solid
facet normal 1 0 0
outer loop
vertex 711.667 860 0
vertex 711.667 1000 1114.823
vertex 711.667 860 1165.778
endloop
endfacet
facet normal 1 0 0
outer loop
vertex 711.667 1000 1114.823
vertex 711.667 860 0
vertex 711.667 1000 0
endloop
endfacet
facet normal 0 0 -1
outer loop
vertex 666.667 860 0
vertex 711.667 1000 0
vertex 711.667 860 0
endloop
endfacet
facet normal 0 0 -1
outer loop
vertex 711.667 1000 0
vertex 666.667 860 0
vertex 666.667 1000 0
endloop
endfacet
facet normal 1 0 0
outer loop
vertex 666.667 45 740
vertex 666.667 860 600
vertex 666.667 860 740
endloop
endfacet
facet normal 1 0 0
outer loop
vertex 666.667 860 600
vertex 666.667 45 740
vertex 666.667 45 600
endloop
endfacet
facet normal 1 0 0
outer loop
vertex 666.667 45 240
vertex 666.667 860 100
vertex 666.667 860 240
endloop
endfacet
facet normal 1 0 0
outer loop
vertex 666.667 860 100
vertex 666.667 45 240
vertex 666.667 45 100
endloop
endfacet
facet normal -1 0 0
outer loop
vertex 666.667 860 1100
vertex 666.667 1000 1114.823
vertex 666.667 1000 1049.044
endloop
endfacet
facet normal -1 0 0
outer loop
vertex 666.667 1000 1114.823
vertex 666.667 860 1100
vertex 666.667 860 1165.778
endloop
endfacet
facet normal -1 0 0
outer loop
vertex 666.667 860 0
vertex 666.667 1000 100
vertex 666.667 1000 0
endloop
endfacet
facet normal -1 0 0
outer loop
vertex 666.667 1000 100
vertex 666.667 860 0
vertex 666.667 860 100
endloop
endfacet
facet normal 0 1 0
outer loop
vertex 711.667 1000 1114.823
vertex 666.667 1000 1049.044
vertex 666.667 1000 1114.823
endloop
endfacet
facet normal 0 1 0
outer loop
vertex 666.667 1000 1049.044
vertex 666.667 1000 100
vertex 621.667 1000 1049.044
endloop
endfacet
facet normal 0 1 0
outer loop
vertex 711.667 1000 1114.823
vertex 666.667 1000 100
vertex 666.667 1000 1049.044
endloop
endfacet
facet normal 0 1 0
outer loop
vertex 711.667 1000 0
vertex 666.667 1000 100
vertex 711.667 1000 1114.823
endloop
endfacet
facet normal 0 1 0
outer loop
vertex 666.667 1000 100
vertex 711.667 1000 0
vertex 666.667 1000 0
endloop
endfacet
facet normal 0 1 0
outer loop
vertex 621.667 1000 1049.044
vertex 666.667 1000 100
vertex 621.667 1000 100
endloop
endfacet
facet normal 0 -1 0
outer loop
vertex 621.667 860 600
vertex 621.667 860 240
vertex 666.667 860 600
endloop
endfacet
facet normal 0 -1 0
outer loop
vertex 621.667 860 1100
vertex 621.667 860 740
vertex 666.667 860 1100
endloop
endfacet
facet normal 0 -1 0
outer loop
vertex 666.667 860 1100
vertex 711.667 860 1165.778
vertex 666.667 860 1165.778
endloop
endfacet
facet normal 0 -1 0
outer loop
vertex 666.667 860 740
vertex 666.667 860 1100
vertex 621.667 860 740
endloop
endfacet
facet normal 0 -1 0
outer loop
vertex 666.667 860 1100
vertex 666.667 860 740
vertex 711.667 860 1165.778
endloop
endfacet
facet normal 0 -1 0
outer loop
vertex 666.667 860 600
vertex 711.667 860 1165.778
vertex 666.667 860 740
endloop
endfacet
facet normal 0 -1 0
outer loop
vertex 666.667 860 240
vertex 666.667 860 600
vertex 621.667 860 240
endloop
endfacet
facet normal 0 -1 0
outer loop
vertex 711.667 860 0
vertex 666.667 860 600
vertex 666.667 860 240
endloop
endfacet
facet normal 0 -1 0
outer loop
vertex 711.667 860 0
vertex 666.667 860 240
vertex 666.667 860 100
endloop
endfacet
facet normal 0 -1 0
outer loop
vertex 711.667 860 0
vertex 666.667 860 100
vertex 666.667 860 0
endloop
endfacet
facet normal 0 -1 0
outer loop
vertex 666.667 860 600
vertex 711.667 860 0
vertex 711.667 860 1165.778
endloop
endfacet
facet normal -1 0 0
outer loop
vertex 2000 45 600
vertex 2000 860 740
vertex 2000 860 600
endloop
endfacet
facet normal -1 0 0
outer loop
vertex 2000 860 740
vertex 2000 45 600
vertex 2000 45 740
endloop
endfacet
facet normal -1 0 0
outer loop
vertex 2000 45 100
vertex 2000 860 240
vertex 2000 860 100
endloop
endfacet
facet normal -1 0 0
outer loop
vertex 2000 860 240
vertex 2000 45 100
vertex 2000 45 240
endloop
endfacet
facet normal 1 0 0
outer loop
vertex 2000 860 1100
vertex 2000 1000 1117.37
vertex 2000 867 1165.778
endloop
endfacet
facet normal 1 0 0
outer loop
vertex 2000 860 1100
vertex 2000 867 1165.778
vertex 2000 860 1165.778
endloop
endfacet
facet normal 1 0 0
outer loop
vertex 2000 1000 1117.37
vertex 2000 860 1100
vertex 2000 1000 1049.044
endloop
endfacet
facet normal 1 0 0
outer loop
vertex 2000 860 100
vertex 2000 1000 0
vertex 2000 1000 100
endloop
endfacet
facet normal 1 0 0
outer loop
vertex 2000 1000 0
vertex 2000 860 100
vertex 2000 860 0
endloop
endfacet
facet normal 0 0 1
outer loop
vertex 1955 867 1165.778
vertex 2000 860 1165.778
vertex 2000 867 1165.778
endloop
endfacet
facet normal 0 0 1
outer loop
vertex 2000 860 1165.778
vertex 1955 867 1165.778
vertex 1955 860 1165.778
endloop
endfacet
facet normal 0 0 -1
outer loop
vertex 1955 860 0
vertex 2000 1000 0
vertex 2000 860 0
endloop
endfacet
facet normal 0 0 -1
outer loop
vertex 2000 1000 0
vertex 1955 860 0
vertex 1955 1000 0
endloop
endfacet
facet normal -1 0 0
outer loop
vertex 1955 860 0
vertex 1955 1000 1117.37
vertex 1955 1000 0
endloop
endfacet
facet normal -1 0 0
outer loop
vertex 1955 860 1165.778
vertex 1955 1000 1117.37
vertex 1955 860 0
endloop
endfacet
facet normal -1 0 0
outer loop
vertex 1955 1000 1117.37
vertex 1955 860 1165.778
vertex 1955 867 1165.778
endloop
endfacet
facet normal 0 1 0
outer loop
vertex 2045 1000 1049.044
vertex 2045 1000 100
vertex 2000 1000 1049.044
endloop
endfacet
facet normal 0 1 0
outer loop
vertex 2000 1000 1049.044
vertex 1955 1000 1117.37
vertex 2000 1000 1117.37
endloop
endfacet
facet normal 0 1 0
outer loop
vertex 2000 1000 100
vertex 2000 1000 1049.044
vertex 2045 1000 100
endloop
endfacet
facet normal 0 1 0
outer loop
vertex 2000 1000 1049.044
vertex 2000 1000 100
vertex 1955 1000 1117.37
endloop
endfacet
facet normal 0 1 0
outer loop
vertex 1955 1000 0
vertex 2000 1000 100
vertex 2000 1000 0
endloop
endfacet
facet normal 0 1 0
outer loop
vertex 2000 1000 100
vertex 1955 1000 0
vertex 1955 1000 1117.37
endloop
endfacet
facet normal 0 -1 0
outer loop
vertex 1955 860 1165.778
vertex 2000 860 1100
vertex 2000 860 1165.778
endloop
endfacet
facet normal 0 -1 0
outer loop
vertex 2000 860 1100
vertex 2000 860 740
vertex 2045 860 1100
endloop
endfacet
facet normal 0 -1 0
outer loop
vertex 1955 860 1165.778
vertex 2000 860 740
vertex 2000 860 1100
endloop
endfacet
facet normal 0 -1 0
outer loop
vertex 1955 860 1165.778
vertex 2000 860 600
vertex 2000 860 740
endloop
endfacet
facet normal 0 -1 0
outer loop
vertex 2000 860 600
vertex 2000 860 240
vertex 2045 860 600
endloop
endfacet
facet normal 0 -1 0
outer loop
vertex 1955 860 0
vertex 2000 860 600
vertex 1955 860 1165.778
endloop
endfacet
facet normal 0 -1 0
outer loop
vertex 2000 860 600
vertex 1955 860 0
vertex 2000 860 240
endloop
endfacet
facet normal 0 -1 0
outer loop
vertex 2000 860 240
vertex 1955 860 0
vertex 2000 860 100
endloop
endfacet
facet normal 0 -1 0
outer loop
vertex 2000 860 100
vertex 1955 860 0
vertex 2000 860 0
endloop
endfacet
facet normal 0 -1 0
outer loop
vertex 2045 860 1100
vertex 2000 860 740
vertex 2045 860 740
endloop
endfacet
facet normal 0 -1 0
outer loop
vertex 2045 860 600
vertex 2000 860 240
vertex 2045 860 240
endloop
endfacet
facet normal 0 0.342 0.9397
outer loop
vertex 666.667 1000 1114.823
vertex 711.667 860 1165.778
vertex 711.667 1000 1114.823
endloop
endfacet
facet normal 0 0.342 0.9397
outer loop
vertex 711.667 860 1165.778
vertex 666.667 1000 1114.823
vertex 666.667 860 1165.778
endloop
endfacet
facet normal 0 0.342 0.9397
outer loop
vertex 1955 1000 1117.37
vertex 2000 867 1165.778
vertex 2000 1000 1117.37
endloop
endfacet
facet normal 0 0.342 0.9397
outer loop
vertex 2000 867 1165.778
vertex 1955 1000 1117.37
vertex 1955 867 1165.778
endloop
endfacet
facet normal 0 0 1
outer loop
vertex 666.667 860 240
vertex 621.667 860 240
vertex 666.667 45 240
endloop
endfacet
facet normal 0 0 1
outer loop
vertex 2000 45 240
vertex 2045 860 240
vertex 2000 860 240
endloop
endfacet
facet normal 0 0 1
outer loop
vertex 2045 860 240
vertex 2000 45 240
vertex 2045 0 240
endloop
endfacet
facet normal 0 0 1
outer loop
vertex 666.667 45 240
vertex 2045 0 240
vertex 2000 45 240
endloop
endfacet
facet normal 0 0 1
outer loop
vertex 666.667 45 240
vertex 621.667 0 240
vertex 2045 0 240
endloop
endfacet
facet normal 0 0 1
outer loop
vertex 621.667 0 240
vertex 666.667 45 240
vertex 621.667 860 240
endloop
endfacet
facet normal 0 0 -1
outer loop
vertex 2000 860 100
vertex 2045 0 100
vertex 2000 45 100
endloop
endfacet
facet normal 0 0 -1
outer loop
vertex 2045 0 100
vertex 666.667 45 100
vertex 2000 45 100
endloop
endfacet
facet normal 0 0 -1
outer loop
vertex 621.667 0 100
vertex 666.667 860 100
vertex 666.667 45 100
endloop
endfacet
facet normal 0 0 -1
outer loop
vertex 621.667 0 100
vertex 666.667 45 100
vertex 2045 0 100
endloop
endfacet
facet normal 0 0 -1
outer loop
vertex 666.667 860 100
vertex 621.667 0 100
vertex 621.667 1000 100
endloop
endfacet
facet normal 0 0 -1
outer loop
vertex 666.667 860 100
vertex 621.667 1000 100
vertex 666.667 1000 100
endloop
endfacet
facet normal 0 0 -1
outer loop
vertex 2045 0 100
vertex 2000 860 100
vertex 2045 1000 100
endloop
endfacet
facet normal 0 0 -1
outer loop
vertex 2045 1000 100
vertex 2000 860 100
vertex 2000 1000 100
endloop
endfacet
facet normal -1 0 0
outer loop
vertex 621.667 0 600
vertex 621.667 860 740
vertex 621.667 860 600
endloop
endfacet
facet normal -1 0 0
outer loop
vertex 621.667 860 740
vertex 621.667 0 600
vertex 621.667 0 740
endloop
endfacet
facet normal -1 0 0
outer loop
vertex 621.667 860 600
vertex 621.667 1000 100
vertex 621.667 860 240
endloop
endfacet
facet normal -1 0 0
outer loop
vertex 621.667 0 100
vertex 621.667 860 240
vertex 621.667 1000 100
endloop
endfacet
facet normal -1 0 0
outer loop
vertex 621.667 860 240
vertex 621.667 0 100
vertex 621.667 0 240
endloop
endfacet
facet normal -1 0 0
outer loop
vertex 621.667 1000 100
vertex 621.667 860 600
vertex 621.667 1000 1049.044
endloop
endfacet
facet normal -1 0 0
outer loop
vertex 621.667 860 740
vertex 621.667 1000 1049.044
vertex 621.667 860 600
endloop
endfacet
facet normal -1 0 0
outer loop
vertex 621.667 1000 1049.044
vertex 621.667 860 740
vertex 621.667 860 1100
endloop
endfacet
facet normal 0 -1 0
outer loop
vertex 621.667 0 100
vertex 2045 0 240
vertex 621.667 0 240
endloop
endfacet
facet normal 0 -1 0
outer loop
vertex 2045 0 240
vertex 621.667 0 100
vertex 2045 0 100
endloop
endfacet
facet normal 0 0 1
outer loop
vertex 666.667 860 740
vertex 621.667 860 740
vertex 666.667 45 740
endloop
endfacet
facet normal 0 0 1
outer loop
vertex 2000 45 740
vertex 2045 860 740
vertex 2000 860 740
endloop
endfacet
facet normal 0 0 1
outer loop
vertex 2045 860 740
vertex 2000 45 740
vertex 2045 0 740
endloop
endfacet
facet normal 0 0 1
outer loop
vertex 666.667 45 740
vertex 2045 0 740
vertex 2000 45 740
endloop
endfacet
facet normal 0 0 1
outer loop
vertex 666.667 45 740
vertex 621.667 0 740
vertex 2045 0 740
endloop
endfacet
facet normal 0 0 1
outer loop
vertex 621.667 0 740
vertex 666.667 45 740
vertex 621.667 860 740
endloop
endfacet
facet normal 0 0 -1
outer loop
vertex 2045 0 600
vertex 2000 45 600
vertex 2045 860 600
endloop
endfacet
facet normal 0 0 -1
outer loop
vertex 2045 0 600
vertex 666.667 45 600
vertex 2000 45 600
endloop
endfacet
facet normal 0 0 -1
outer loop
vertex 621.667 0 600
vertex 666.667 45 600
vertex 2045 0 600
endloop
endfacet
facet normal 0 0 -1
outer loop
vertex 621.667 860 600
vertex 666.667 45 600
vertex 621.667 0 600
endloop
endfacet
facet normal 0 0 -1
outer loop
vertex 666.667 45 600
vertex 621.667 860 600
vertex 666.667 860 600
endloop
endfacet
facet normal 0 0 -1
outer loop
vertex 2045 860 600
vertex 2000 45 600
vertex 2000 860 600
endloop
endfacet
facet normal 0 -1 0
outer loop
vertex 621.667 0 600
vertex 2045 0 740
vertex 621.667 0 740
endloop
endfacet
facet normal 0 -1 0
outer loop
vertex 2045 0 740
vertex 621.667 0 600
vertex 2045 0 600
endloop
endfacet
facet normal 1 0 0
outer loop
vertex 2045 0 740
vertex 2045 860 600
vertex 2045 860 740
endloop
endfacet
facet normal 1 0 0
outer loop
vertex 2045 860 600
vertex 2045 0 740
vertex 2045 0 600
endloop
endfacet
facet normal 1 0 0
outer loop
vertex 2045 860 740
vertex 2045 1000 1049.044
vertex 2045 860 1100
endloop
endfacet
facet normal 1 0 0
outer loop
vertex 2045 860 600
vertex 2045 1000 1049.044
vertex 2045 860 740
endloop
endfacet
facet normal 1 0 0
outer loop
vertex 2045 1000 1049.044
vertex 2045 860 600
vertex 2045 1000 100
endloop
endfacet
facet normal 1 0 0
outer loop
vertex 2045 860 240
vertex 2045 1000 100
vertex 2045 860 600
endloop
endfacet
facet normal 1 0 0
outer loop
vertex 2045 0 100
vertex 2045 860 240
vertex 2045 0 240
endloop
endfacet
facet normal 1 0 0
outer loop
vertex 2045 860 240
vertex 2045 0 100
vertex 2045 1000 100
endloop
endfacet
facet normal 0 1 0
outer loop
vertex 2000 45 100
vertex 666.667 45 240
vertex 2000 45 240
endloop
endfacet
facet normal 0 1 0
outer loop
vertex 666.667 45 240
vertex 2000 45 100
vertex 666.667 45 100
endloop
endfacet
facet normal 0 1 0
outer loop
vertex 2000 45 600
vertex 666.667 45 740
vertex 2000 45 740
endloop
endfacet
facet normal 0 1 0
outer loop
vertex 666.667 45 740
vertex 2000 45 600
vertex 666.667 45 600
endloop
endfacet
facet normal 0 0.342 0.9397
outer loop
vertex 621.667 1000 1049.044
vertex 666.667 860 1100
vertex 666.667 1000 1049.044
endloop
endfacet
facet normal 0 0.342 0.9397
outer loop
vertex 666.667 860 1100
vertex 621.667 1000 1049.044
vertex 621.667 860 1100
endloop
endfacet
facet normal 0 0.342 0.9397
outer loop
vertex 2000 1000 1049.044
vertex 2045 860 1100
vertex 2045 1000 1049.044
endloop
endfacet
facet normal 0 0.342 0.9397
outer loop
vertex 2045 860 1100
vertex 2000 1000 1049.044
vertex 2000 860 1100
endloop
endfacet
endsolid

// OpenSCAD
module foundation (
    rotation,kayakHeight,
    plankWidth,plankThickness,
    totalWidth,totalLength,
    groundScrewHeight,
    roofPlankWidth,
    x,y,z){
    
    
// ---------- Calculated varables ----------

backPillarHeight = kayakHeight*2
        +groundScrewHeight
        +plankWidth*2; 

        
// ---------- Code ---------- 


union(){    
translate([
    x,
    y,
    z]) 
union(){
// ---------- pillar ---------- 
color("Wheat")
difference () {
union(){
    
// piller 1
translate([
    0,
    totalWidth-plankWidth,
    0]) 
cube(size = [
    plankThickness,
    plankWidth,
    backPillarHeight
    +roofPlankWidth*cos(rotation)]);
    
// piller 2
translate([
    totalLength/3*2-plankThickness,
    totalWidth-plankWidth,
    0]) 
cube(size = [
    plankThickness,
    plankWidth,
    backPillarHeight
    +roofPlankWidth*cos(rotation)]);
}

union () {
translate([
    -1,
    totalWidth-plankWidth,
    groundScrewHeight
    +plankWidth*2
    +kayakHeight*2
    +roofPlankWidth*cos(rotation)]) 
rotate([-rotation,0,0])
cube(size = [
    plankThickness+2,
    plankWidth+9,
    kayakHeight]);
    
translate([
    totalLength/3*2
    -plankThickness-1,
    totalWidth-plankWidth+7,
    groundScrewHeight
    +plankWidth*2
    +kayakHeight*2
    +roofPlankWidth*cos(rotation)]) 
rotate([-rotation,0,0])
cube(size = [
    plankThickness+2,
    plankWidth+9,
    kayakHeight]);
}}

// ---------- shelf ---------- 
color("Tan")
union () {
// piller 1 shelf 1
translate([
    -plankThickness,
    0,
    groundScrewHeight]) 
cube(size = [
    plankThickness,
    totalWidth,
    plankWidth]);

// piller 1 shelf 2
translate([
    -plankThickness,
    0,
    groundScrewHeight
    +plankWidth
    +kayakHeight]) 
cube(size = [
    plankThickness,
    totalWidth,
    plankWidth]);
    
// piller 2 shelf 1
translate([
    totalLength/3*2,
    0,
    groundScrewHeight]) 
cube(size = [
    plankThickness,
    totalWidth,
    plankWidth]);
    
// piller 2 shelf 2
translate([
    totalLength/3*2,
    0,
    groundScrewHeight
    +plankWidth
    +kayakHeight]) 
cube(size = [
    plankThickness,
    totalWidth,
    plankWidth]);

// stretcher top
translate([
    0,
    0,
    groundScrewHeight
    ]) 
cube(size = [
    totalLength/3*2+plankThickness,
    plankThickness,
    plankWidth]);
    
// stretcher bottom
translate([
    0,
    0,
    groundScrewHeight
    +plankWidth
    +kayakHeight]) 
cube(size = [
    totalLength/3*2+plankThickness,
    plankThickness,
    plankWidth]);
}   

// --------- pillar filler--------- 
color("Wheat")
union () {
// Filler left bottom
translate([
    -plankThickness,
    totalWidth-plankWidth,
    groundScrewHeight+plankWidth]) 
cube(size = [
    plankThickness,
    plankWidth,
    kayakHeight]);

color("Wheat")
difference () {
// Filler left top
translate([
    -plankThickness,
    totalWidth-plankWidth,
    groundScrewHeight
    +plankWidth*2
    +kayakHeight
    ]) 
cube(size = [
    plankThickness,
    plankWidth,
    kayakHeight
    ]);

// remove angle
translate([
    -plankThickness-1,
    totalWidth-plankWidth,
    groundScrewHeight
    +plankWidth*2
    +kayakHeight*2
    ]) 
rotate([-rotation,0,0])
cube(size = [
    plankThickness+1,
    plankWidth+9,
    kayakHeight]);
}    


// Filler right bottom
color("Wheat")
union () {
// piller 1 shelf 1
translate([
    totalLength/3*2,
    totalWidth-plankWidth,
    groundScrewHeight+plankWidth]) 
cube(size = [
    plankThickness,
    plankWidth,
    kayakHeight]);
    
color("Wheat")
difference () {
// Filler right top
translate([
    totalLength/3*2,
    totalWidth-plankWidth,
    groundScrewHeight
    +plankWidth*2
    +kayakHeight
    ]) 
cube(size = [
    plankThickness,
    plankWidth,
    kayakHeight]);

// remove angle
translate([
    totalLength/3*2,
    totalWidth-plankWidth,
    groundScrewHeight
    +plankWidth*2
    +kayakHeight*2
    ]) 
rotate([-rotation,0,0])
cube(size = [
    plankThickness+1,
    plankWidth+9,
    kayakHeight]);
}}}}}}







// example
rotation = 20;

plankWidth     = 140;  // pine
plankThickness = 45;  // pine

totalWidth  = 1000;  // kayak width 
totalLength = 2000;  // kayak lenght

roofWidthIn  = 1000;  // calculated hypnotherapy, inner

pilleaLowestHeight = 1500; //

groundScrewHeight = 100;

    
foundation(
    rotation,360,
    plankWidth,plankThickness,
    totalWidth,totalLength,
    groundScrewHeight,
    70,
    totalLength/3,0,0);
